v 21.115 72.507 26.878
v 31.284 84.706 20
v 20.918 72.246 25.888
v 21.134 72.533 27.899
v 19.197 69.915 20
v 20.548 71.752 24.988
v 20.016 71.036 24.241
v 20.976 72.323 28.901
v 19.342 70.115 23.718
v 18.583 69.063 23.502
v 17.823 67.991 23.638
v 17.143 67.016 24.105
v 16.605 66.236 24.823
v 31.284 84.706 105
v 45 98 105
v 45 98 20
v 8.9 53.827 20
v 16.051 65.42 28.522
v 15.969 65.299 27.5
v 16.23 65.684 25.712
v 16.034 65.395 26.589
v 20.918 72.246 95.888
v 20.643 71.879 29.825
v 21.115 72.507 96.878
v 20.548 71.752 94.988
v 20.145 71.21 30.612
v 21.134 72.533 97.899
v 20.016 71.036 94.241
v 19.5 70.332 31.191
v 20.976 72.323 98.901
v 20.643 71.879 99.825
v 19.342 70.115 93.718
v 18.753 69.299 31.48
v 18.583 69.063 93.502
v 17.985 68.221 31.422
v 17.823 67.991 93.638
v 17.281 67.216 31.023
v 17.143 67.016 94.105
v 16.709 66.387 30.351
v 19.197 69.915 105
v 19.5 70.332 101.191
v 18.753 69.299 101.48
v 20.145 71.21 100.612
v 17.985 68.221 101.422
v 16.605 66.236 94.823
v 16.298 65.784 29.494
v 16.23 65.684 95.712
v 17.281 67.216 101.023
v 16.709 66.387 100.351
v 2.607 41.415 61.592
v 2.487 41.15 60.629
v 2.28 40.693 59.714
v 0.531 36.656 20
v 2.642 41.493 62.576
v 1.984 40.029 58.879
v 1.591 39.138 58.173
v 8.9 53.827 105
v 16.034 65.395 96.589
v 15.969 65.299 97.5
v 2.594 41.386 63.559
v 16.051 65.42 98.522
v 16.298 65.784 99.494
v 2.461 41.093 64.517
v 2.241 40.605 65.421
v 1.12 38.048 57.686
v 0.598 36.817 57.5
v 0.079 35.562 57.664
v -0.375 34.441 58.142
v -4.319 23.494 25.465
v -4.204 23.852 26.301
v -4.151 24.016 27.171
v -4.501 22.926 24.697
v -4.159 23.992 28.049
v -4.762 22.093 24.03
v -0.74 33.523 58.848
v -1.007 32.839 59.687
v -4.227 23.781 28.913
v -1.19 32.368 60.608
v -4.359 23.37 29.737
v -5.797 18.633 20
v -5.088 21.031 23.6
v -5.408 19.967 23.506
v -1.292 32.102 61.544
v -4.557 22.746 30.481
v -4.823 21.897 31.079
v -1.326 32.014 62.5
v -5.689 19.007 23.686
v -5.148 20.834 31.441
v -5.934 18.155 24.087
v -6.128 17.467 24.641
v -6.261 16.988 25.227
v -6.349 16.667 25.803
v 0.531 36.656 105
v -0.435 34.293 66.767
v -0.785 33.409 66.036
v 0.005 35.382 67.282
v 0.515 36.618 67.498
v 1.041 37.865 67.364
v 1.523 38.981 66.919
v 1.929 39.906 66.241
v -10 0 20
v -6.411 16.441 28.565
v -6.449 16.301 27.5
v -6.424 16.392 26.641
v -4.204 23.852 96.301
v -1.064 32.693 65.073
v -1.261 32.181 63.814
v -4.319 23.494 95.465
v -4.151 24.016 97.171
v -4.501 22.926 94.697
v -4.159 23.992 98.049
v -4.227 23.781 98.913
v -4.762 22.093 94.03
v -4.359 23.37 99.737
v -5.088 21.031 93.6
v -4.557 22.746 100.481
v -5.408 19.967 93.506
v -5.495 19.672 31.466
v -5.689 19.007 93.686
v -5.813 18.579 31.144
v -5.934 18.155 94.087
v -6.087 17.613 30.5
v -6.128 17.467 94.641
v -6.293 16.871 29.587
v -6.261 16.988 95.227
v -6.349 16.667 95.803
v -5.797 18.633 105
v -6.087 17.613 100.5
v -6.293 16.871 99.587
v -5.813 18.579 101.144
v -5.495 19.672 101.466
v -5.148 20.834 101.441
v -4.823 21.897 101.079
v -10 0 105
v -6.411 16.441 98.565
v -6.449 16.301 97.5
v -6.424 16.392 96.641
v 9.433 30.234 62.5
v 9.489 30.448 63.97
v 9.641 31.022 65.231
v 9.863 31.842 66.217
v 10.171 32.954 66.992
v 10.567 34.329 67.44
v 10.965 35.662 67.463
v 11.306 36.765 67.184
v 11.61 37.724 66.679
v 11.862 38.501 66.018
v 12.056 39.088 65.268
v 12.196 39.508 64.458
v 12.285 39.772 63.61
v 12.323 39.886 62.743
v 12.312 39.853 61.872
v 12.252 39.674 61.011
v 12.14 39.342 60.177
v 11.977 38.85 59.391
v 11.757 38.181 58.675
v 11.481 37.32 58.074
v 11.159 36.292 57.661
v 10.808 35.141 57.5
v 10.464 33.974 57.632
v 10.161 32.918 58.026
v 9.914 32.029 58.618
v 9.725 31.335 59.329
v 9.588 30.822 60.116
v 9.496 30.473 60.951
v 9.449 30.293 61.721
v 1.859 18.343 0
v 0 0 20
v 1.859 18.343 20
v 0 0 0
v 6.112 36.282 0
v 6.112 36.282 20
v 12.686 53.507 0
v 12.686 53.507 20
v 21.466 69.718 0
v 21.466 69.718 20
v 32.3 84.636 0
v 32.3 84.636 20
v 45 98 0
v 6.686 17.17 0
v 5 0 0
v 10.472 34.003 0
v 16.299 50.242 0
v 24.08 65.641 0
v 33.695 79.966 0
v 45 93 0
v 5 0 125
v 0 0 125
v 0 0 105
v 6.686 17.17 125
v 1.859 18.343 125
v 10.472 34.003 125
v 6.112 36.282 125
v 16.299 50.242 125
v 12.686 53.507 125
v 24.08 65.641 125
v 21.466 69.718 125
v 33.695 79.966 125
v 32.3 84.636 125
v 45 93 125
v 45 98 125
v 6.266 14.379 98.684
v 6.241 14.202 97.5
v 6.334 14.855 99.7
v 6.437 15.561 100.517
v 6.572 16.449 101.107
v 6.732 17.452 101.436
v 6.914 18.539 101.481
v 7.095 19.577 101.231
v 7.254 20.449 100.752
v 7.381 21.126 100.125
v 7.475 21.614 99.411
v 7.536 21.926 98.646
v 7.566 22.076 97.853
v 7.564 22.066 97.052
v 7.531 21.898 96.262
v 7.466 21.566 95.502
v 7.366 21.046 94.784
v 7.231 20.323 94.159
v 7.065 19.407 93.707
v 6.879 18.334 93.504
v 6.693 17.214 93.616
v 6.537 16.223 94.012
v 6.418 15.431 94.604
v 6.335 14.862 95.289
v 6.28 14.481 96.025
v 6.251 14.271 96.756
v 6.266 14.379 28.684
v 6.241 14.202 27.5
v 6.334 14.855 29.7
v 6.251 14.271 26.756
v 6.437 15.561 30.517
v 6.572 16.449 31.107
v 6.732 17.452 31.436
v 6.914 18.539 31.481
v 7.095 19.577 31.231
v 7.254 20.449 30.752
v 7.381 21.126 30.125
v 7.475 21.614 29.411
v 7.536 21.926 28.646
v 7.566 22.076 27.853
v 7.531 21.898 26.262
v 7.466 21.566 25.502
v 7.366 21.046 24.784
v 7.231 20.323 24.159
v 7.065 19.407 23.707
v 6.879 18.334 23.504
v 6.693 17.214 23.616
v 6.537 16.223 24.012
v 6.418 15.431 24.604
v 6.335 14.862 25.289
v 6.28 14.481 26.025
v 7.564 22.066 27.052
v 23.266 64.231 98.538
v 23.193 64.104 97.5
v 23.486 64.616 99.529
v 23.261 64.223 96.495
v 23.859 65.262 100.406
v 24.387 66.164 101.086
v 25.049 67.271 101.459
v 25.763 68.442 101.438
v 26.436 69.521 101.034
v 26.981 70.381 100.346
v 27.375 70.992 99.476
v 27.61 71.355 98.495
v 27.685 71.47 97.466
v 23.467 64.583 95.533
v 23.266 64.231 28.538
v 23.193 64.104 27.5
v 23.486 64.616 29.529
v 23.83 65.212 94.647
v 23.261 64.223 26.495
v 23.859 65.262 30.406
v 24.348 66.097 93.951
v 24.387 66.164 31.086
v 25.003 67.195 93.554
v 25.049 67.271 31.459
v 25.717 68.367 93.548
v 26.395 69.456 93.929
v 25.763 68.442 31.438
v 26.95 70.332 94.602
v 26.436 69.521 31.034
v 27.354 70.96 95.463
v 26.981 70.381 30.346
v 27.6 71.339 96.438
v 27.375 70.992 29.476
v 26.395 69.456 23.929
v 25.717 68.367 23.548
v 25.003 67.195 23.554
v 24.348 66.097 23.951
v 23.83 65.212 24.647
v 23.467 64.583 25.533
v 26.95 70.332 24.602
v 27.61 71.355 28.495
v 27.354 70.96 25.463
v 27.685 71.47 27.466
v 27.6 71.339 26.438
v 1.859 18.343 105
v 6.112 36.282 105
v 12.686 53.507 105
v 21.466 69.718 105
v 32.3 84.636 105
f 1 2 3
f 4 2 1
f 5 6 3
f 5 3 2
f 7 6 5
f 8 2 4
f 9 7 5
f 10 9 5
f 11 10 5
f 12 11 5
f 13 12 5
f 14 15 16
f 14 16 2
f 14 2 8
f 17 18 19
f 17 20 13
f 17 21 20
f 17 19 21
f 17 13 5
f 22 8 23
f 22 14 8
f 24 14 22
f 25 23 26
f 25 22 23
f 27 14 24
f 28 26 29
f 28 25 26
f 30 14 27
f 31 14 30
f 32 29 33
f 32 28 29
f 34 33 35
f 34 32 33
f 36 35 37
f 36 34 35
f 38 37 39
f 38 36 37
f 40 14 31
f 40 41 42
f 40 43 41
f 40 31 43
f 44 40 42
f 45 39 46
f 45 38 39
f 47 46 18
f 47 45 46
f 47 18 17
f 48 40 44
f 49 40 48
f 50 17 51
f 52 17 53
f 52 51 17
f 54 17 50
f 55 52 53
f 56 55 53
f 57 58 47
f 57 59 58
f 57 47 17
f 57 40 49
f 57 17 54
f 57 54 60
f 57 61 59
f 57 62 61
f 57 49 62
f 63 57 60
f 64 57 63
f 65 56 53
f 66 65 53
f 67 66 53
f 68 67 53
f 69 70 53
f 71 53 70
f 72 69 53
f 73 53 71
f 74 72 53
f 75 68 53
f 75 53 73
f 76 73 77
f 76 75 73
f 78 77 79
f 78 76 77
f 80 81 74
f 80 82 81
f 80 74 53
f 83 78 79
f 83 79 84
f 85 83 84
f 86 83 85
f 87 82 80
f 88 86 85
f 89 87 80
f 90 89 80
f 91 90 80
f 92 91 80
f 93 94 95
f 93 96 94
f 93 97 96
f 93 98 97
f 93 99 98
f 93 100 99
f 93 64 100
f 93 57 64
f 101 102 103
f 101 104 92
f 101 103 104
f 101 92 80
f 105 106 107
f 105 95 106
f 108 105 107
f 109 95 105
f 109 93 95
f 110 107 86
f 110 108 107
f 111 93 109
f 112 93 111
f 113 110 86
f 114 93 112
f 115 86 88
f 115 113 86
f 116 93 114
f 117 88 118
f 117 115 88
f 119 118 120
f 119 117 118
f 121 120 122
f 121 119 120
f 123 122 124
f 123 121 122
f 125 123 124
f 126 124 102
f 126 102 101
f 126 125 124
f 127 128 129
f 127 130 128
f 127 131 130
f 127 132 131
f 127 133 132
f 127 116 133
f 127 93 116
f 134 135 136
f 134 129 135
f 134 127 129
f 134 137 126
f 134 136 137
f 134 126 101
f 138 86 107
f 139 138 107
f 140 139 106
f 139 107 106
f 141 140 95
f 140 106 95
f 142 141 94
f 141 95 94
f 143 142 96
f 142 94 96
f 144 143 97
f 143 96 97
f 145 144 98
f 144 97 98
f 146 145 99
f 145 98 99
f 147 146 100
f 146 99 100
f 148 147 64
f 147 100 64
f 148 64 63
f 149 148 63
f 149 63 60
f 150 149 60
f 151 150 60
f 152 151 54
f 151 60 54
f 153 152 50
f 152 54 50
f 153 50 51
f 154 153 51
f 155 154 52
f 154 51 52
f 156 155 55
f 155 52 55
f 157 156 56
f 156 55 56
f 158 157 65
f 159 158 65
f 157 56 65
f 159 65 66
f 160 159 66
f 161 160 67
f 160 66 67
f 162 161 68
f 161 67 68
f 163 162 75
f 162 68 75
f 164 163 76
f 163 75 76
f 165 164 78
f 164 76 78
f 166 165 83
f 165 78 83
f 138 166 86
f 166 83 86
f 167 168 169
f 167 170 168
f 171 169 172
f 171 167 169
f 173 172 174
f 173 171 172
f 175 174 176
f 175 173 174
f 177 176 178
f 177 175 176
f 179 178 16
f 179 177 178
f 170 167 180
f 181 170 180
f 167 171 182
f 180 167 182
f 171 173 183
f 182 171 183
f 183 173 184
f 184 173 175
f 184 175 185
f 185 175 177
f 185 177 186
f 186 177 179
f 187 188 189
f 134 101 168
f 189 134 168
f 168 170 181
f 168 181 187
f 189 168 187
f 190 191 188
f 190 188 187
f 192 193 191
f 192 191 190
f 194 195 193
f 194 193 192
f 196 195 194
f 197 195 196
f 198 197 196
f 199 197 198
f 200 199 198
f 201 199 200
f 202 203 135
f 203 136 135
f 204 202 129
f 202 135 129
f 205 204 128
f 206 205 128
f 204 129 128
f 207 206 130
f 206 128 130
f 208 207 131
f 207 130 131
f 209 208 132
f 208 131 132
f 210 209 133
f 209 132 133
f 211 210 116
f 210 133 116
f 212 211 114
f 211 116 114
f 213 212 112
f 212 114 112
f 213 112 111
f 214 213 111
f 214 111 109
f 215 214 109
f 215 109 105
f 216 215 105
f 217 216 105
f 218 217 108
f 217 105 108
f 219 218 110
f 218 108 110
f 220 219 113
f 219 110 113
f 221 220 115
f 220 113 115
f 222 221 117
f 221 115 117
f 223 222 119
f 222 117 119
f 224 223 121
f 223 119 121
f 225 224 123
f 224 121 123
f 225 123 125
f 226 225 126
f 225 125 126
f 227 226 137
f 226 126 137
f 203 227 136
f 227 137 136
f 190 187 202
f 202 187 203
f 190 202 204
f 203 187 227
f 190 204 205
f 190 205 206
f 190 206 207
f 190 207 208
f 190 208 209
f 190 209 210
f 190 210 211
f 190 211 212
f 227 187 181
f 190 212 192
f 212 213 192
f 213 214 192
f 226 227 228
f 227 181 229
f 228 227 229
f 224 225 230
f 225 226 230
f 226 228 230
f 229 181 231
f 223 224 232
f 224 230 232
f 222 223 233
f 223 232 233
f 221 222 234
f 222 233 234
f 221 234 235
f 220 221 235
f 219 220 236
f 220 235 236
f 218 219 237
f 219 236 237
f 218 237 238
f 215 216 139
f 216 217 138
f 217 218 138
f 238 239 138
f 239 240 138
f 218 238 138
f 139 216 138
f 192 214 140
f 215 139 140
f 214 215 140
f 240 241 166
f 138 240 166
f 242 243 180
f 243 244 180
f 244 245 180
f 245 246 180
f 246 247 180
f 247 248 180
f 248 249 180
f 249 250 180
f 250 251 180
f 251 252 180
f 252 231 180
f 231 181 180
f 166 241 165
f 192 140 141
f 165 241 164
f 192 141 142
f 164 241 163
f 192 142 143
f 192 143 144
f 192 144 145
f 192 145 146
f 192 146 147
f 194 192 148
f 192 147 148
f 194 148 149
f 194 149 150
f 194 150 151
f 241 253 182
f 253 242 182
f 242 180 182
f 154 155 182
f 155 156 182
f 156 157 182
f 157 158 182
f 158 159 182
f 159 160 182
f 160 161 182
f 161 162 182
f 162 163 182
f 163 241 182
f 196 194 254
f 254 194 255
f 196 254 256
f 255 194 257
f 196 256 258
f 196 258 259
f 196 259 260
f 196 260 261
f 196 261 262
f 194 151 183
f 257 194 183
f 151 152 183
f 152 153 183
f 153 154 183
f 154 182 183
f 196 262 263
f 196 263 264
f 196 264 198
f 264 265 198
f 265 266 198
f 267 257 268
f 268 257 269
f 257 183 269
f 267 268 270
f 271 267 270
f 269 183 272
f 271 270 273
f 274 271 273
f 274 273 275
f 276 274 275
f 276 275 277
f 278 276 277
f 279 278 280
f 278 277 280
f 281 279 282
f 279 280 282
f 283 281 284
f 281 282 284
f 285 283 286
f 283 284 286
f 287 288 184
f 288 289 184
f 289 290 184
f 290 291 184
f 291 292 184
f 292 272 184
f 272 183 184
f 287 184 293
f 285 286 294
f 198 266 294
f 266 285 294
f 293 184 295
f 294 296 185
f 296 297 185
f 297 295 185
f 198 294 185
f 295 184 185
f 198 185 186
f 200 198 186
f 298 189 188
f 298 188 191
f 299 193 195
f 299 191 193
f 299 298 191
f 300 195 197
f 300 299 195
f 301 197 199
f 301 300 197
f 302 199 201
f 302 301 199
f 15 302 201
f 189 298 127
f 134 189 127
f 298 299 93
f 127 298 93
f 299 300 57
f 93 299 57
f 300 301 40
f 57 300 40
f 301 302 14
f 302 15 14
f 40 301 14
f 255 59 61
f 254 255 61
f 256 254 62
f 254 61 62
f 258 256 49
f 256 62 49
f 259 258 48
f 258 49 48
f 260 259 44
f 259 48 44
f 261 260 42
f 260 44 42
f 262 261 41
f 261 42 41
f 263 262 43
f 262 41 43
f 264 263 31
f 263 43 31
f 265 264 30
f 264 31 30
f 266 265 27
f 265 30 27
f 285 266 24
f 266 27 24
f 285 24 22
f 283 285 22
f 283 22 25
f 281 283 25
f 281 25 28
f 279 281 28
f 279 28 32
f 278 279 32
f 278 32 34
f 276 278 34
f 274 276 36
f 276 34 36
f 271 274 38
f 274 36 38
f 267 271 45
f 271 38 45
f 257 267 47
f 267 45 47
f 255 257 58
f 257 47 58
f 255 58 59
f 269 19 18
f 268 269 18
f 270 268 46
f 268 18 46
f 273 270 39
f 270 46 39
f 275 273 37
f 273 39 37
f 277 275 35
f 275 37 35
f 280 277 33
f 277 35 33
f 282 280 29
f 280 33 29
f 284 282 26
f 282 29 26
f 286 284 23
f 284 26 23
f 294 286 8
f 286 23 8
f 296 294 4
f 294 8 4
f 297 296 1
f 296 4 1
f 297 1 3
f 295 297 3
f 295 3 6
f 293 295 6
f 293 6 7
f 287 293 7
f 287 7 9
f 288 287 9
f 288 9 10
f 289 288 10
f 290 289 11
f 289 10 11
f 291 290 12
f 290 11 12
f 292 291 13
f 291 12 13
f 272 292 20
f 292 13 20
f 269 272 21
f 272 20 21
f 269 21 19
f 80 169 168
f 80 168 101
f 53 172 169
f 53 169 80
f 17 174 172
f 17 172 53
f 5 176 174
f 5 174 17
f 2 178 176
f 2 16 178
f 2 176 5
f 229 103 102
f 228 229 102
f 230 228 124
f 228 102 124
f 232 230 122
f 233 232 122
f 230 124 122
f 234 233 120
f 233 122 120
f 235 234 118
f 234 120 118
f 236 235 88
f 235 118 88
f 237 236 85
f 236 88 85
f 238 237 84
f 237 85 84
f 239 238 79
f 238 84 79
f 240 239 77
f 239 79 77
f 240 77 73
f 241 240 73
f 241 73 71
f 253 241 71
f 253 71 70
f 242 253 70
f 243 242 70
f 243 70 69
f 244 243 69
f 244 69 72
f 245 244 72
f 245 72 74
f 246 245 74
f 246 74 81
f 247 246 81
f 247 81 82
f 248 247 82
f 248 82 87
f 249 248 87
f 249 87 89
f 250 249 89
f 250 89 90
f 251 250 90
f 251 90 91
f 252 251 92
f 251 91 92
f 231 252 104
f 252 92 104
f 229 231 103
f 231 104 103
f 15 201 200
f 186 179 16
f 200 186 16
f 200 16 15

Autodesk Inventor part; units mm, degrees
ref_plane "YZ Plane" through (0, 0, 0) normal (1, 0, 0) x (0, 1, 0)
sketch "Sketch1" plane through (0, 0, 0) normal (0, 0, 1) x (1, 0, 0)
  arc A0 (45, 98) -> (0, 0) centre (139.9137, -4.9145) ccw
  line L0 (45, 98) -> (45, 93)
  line L1 (0, 0) -> (5, 0)
  arc A1 (45, 93) -> (5, 0) centre (144.908, -5.0734) ccw
  dimension "d0" = 140
  dimension "d1" = 98
  dimension "d3" = 45
  dimension "d4" = 5
  dimension "d5" = 5
  dimension "d6" = 140
extrude "Extrusion1" add sketch "Sketch1" along normal blind 125
ref_plane "Work Plane1" through (0, 0, 62.5) normal (0, 0, -1) x (-1, 0, 0)
sketch "Sketch3" plane through (0, 0, 62.5) normal (0, 0, -1) x (-1, 0, 0)
  arc A0 (0, 0) -> (-45, 98) centre (-139.9137, -4.9145) ccw projected
  line L0 (0, 0) -> (10, 0)
  arc A1 (10, 0) -> (-45, 98) centre (-152.788, -26.9269) ccw
  arc A2 (0, 0) -> (-45, 98) centre (-139.9137, -4.9145) ccw
  dimension "d19" = 10
  dimension "d20" = 165
extrude "Extrusion3" add sketch "Sketch3" along normal mid plane 85
ref_plane "Work Plane2" through (-10, 0, 62.5) normal (-0.9866, 0.1632, 0) x (-0.1632, -0.9866, 0)
sketch "Sketch2" plane through (-10, 0, 62.5) normal (-0.9866, 0.1632, 0) x (-0.1632, -0.9866, 0)
  circle A0 centre (-20.6619, -35) radius 4
  circle A1 centre (-72.6619, -35) radius 4
  circle A2 centre (-20.6619, 35) radius 4
  circle A3 centre (-72.6619, 35) radius 4
  line L0 (0, 42.5) -> (0, -42.5) projected
  line L1 (-72.6619, 35) -> (-20.6619, 35) construction
  line L2 (-20.6619, 35) -> (-20.6619, -35) construction
  line L3 (-20.6619, -35) -> (-72.6619, -35) construction
  line L4 (-72.6619, -35) -> (-72.6619, 35) construction
  line L5 (-105.6619, -42.5) -> (-105.6619, 42.5) projected
  point P0 (0, 0)
  point P1 (-20.6619, 0)
  point P2 (0, 0)
  dimension "d9" = 8
  dimension "d10" = 8
  dimension "d12" = 52
  dimension "d14" = 8
  dimension "d15" = 8
  dimension "d16" = 70
  dimension "d23" = 33
extrude "Extrusion2" cut sketch "Sketch2" against normal through all
sketch "Sketch4" plane through (-10, 0, 62.5) normal (-0.9866, 0.1632, 0) x (-0.1632, -0.9866, 0)
  circle A0 centre (-38, 0) radius 5
  line L0 (0, 42.5) -> (0, -42.5) projected
  point P0 (-1.6319, -62.5)
  point P1 (0, 0)
  dimension "d24" = 10
  dimension "d25" = 38
extrude "Extrusion4" cut sketch "Sketch4" against normal through all
properties part number "SJ009" material "ABS Plastic"
